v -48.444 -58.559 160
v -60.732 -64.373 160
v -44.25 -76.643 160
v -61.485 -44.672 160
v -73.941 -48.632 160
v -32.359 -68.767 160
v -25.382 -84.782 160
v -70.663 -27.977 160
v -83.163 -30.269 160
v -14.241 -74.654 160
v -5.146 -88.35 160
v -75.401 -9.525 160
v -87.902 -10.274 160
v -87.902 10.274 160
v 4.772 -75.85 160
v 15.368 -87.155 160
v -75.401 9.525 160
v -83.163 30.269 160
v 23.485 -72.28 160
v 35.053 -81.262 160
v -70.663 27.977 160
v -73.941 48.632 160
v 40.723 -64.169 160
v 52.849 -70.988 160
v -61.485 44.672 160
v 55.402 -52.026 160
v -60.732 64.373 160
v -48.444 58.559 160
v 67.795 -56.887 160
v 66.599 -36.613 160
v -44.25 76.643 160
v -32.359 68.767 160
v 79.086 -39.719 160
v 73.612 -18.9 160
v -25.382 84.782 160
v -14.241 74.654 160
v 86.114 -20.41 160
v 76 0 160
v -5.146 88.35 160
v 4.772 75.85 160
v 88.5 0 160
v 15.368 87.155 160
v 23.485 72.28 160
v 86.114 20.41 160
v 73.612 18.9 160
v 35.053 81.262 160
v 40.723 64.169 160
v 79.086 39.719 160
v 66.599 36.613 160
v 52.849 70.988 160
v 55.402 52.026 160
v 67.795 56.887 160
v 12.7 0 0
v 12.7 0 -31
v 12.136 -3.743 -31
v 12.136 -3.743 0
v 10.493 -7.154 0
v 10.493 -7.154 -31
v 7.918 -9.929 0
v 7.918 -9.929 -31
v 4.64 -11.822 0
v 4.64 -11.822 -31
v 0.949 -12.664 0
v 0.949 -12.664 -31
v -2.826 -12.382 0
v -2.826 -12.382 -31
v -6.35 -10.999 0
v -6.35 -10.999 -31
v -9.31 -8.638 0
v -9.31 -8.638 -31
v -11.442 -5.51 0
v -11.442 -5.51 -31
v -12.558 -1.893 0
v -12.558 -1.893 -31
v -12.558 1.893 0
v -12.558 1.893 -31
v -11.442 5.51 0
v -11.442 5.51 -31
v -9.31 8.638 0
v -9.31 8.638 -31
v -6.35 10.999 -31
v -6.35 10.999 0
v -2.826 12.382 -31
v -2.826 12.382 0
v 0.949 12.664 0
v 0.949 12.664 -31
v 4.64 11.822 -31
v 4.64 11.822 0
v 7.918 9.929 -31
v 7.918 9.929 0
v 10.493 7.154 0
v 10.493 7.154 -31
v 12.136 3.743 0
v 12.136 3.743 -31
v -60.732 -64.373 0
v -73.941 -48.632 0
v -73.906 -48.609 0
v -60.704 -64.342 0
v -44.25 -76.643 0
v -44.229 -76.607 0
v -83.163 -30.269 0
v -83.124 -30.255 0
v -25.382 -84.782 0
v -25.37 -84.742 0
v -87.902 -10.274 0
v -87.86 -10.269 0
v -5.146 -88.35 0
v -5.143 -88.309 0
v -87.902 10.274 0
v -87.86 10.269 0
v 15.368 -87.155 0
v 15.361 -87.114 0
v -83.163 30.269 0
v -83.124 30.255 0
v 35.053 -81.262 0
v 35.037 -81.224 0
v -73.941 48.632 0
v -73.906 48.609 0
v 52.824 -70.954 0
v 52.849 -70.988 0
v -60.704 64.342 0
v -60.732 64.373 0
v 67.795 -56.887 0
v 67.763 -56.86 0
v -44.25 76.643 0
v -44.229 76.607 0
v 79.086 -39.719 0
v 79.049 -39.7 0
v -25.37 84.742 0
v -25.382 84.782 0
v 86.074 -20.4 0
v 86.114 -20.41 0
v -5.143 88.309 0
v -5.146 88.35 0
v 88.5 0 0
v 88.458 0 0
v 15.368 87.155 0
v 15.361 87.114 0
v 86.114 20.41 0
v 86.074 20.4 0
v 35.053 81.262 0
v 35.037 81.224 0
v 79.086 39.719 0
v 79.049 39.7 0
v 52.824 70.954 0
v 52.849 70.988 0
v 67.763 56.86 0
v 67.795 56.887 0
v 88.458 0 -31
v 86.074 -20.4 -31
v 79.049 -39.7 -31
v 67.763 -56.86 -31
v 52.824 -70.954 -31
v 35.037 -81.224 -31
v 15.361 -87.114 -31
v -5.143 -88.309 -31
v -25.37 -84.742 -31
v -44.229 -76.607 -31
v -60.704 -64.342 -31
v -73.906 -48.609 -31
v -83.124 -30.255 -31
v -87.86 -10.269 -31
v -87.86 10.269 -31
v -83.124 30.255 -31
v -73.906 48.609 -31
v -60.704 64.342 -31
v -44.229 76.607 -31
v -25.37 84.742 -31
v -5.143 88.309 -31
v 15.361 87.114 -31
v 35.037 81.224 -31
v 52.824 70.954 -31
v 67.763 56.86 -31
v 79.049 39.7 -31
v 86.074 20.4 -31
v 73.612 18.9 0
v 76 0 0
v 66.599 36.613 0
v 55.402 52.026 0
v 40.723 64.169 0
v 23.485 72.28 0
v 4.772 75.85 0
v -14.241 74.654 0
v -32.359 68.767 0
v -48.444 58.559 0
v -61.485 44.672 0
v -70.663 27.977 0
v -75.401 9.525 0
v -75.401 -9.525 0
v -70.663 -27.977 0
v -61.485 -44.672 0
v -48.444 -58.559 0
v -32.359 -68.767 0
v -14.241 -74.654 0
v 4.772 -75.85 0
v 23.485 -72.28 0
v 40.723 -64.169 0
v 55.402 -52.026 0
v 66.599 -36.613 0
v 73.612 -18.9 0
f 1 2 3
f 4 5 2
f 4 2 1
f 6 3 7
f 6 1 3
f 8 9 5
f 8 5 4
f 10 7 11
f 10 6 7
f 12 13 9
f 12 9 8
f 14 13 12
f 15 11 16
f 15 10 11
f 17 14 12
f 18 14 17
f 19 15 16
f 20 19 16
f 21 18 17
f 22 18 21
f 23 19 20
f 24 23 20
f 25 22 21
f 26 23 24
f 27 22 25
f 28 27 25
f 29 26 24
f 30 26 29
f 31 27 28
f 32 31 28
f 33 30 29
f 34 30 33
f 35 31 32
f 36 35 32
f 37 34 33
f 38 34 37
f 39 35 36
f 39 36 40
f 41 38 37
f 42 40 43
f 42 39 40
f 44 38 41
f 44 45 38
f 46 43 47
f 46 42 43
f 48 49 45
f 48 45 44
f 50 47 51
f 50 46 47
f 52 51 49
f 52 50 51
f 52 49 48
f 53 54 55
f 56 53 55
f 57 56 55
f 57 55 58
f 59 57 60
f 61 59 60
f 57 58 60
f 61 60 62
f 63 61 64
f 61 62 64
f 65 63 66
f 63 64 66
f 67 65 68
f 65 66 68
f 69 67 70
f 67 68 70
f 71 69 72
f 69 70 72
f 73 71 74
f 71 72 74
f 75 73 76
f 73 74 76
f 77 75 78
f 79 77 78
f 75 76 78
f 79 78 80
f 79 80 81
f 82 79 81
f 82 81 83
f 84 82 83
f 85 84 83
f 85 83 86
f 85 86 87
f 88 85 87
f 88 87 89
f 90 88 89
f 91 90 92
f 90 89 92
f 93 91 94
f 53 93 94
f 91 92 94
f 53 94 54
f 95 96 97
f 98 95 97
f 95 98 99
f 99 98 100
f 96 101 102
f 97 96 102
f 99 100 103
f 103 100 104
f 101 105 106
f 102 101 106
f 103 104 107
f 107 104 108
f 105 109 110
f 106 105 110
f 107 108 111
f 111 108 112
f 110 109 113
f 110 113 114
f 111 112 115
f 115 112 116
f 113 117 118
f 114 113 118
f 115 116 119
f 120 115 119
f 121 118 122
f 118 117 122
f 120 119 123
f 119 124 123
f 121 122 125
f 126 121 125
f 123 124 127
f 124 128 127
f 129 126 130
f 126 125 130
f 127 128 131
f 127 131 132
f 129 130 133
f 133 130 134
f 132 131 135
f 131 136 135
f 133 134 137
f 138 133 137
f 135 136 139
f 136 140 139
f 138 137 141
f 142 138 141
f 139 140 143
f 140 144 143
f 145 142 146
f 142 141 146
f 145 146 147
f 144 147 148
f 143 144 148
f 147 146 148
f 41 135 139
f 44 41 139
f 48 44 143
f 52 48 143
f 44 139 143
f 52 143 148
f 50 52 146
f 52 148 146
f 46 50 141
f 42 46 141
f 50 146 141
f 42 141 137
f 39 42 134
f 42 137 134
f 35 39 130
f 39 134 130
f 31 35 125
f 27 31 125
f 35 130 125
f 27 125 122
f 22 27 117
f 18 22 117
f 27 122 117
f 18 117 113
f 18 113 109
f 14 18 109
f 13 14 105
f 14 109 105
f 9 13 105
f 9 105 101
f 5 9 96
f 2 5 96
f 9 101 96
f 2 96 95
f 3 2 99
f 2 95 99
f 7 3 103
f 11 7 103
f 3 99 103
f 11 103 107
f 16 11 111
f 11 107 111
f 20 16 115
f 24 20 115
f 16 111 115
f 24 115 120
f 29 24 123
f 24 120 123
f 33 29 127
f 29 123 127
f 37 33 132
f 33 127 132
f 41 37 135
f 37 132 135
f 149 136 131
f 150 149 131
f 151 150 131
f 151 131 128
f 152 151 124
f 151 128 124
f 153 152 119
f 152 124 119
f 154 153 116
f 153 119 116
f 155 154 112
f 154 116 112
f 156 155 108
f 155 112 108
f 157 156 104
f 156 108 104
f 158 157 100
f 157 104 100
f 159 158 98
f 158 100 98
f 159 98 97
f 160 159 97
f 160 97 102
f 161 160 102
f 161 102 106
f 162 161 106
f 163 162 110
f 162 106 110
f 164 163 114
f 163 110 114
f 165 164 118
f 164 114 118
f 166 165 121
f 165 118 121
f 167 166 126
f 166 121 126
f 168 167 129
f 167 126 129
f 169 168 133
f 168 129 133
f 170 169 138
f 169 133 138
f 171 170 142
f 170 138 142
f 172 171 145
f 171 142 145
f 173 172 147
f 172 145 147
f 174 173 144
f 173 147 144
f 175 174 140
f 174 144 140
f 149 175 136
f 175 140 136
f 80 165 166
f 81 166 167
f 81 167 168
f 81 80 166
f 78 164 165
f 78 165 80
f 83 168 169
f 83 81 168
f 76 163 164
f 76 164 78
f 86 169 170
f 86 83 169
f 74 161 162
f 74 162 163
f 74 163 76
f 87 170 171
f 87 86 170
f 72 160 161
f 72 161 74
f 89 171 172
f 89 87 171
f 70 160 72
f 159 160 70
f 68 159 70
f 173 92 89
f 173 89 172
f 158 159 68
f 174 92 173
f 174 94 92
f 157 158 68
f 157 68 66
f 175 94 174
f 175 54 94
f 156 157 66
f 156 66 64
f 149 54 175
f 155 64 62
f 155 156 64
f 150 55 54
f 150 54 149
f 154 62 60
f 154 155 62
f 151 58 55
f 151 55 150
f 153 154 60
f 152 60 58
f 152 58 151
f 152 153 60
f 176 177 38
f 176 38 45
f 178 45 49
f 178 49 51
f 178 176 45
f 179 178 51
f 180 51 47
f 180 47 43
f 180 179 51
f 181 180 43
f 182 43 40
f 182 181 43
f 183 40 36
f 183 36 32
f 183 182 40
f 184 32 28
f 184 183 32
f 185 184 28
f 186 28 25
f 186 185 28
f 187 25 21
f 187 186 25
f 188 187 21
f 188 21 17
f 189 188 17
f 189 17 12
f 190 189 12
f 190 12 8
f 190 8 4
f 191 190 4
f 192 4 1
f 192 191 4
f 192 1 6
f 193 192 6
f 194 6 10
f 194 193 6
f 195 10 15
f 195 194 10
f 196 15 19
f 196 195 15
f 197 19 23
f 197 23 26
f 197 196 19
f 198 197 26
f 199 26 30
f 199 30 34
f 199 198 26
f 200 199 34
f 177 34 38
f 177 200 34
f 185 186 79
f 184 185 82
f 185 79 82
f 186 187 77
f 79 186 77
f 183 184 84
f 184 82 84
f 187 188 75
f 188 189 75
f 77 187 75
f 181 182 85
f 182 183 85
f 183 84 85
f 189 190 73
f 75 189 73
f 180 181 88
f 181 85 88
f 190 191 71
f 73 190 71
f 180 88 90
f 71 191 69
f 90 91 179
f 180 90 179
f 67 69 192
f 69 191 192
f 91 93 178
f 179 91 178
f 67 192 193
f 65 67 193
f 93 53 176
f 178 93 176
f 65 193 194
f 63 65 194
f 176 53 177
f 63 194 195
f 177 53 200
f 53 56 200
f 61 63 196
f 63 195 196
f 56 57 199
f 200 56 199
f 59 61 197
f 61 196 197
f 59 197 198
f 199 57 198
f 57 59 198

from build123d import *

# Parameters (mm, degrees)
F0_R     = 88.5
F0_R_2   = 76
F1_DEPTH = 160
F2_R     = 88.458341
F3_DEPTH = 31
F4_R     = 12.7
F5_DEPTH = 31


with BuildPart() as f1:
    # F0 (on Top) → F1 (new body)
    with BuildSketch(Plane.XY):
        Circle(F0_R)
        Circle(F0_R_2, mode=Mode.SUBTRACT)
    extrude(amount=F1_DEPTH)

    # F2 (on face) → F3 (join)
    with BuildSketch(Plane(origin=(0, 0, 0), x_dir=(1, 0, 0), z_dir=(0, 0, -1))):
        Circle(F2_R)
    extrude(amount=F3_DEPTH)

    # F4 (on face) → F5 (cut, through all)
    with BuildSketch(Plane(origin=(0, 0, -31), x_dir=(1, 0, 0), z_dir=(0, 0, -1))):
        Circle(F4_R)
    extrude(amount=-F5_DEPTH, mode=Mode.SUBTRACT)


solid = f1.part
